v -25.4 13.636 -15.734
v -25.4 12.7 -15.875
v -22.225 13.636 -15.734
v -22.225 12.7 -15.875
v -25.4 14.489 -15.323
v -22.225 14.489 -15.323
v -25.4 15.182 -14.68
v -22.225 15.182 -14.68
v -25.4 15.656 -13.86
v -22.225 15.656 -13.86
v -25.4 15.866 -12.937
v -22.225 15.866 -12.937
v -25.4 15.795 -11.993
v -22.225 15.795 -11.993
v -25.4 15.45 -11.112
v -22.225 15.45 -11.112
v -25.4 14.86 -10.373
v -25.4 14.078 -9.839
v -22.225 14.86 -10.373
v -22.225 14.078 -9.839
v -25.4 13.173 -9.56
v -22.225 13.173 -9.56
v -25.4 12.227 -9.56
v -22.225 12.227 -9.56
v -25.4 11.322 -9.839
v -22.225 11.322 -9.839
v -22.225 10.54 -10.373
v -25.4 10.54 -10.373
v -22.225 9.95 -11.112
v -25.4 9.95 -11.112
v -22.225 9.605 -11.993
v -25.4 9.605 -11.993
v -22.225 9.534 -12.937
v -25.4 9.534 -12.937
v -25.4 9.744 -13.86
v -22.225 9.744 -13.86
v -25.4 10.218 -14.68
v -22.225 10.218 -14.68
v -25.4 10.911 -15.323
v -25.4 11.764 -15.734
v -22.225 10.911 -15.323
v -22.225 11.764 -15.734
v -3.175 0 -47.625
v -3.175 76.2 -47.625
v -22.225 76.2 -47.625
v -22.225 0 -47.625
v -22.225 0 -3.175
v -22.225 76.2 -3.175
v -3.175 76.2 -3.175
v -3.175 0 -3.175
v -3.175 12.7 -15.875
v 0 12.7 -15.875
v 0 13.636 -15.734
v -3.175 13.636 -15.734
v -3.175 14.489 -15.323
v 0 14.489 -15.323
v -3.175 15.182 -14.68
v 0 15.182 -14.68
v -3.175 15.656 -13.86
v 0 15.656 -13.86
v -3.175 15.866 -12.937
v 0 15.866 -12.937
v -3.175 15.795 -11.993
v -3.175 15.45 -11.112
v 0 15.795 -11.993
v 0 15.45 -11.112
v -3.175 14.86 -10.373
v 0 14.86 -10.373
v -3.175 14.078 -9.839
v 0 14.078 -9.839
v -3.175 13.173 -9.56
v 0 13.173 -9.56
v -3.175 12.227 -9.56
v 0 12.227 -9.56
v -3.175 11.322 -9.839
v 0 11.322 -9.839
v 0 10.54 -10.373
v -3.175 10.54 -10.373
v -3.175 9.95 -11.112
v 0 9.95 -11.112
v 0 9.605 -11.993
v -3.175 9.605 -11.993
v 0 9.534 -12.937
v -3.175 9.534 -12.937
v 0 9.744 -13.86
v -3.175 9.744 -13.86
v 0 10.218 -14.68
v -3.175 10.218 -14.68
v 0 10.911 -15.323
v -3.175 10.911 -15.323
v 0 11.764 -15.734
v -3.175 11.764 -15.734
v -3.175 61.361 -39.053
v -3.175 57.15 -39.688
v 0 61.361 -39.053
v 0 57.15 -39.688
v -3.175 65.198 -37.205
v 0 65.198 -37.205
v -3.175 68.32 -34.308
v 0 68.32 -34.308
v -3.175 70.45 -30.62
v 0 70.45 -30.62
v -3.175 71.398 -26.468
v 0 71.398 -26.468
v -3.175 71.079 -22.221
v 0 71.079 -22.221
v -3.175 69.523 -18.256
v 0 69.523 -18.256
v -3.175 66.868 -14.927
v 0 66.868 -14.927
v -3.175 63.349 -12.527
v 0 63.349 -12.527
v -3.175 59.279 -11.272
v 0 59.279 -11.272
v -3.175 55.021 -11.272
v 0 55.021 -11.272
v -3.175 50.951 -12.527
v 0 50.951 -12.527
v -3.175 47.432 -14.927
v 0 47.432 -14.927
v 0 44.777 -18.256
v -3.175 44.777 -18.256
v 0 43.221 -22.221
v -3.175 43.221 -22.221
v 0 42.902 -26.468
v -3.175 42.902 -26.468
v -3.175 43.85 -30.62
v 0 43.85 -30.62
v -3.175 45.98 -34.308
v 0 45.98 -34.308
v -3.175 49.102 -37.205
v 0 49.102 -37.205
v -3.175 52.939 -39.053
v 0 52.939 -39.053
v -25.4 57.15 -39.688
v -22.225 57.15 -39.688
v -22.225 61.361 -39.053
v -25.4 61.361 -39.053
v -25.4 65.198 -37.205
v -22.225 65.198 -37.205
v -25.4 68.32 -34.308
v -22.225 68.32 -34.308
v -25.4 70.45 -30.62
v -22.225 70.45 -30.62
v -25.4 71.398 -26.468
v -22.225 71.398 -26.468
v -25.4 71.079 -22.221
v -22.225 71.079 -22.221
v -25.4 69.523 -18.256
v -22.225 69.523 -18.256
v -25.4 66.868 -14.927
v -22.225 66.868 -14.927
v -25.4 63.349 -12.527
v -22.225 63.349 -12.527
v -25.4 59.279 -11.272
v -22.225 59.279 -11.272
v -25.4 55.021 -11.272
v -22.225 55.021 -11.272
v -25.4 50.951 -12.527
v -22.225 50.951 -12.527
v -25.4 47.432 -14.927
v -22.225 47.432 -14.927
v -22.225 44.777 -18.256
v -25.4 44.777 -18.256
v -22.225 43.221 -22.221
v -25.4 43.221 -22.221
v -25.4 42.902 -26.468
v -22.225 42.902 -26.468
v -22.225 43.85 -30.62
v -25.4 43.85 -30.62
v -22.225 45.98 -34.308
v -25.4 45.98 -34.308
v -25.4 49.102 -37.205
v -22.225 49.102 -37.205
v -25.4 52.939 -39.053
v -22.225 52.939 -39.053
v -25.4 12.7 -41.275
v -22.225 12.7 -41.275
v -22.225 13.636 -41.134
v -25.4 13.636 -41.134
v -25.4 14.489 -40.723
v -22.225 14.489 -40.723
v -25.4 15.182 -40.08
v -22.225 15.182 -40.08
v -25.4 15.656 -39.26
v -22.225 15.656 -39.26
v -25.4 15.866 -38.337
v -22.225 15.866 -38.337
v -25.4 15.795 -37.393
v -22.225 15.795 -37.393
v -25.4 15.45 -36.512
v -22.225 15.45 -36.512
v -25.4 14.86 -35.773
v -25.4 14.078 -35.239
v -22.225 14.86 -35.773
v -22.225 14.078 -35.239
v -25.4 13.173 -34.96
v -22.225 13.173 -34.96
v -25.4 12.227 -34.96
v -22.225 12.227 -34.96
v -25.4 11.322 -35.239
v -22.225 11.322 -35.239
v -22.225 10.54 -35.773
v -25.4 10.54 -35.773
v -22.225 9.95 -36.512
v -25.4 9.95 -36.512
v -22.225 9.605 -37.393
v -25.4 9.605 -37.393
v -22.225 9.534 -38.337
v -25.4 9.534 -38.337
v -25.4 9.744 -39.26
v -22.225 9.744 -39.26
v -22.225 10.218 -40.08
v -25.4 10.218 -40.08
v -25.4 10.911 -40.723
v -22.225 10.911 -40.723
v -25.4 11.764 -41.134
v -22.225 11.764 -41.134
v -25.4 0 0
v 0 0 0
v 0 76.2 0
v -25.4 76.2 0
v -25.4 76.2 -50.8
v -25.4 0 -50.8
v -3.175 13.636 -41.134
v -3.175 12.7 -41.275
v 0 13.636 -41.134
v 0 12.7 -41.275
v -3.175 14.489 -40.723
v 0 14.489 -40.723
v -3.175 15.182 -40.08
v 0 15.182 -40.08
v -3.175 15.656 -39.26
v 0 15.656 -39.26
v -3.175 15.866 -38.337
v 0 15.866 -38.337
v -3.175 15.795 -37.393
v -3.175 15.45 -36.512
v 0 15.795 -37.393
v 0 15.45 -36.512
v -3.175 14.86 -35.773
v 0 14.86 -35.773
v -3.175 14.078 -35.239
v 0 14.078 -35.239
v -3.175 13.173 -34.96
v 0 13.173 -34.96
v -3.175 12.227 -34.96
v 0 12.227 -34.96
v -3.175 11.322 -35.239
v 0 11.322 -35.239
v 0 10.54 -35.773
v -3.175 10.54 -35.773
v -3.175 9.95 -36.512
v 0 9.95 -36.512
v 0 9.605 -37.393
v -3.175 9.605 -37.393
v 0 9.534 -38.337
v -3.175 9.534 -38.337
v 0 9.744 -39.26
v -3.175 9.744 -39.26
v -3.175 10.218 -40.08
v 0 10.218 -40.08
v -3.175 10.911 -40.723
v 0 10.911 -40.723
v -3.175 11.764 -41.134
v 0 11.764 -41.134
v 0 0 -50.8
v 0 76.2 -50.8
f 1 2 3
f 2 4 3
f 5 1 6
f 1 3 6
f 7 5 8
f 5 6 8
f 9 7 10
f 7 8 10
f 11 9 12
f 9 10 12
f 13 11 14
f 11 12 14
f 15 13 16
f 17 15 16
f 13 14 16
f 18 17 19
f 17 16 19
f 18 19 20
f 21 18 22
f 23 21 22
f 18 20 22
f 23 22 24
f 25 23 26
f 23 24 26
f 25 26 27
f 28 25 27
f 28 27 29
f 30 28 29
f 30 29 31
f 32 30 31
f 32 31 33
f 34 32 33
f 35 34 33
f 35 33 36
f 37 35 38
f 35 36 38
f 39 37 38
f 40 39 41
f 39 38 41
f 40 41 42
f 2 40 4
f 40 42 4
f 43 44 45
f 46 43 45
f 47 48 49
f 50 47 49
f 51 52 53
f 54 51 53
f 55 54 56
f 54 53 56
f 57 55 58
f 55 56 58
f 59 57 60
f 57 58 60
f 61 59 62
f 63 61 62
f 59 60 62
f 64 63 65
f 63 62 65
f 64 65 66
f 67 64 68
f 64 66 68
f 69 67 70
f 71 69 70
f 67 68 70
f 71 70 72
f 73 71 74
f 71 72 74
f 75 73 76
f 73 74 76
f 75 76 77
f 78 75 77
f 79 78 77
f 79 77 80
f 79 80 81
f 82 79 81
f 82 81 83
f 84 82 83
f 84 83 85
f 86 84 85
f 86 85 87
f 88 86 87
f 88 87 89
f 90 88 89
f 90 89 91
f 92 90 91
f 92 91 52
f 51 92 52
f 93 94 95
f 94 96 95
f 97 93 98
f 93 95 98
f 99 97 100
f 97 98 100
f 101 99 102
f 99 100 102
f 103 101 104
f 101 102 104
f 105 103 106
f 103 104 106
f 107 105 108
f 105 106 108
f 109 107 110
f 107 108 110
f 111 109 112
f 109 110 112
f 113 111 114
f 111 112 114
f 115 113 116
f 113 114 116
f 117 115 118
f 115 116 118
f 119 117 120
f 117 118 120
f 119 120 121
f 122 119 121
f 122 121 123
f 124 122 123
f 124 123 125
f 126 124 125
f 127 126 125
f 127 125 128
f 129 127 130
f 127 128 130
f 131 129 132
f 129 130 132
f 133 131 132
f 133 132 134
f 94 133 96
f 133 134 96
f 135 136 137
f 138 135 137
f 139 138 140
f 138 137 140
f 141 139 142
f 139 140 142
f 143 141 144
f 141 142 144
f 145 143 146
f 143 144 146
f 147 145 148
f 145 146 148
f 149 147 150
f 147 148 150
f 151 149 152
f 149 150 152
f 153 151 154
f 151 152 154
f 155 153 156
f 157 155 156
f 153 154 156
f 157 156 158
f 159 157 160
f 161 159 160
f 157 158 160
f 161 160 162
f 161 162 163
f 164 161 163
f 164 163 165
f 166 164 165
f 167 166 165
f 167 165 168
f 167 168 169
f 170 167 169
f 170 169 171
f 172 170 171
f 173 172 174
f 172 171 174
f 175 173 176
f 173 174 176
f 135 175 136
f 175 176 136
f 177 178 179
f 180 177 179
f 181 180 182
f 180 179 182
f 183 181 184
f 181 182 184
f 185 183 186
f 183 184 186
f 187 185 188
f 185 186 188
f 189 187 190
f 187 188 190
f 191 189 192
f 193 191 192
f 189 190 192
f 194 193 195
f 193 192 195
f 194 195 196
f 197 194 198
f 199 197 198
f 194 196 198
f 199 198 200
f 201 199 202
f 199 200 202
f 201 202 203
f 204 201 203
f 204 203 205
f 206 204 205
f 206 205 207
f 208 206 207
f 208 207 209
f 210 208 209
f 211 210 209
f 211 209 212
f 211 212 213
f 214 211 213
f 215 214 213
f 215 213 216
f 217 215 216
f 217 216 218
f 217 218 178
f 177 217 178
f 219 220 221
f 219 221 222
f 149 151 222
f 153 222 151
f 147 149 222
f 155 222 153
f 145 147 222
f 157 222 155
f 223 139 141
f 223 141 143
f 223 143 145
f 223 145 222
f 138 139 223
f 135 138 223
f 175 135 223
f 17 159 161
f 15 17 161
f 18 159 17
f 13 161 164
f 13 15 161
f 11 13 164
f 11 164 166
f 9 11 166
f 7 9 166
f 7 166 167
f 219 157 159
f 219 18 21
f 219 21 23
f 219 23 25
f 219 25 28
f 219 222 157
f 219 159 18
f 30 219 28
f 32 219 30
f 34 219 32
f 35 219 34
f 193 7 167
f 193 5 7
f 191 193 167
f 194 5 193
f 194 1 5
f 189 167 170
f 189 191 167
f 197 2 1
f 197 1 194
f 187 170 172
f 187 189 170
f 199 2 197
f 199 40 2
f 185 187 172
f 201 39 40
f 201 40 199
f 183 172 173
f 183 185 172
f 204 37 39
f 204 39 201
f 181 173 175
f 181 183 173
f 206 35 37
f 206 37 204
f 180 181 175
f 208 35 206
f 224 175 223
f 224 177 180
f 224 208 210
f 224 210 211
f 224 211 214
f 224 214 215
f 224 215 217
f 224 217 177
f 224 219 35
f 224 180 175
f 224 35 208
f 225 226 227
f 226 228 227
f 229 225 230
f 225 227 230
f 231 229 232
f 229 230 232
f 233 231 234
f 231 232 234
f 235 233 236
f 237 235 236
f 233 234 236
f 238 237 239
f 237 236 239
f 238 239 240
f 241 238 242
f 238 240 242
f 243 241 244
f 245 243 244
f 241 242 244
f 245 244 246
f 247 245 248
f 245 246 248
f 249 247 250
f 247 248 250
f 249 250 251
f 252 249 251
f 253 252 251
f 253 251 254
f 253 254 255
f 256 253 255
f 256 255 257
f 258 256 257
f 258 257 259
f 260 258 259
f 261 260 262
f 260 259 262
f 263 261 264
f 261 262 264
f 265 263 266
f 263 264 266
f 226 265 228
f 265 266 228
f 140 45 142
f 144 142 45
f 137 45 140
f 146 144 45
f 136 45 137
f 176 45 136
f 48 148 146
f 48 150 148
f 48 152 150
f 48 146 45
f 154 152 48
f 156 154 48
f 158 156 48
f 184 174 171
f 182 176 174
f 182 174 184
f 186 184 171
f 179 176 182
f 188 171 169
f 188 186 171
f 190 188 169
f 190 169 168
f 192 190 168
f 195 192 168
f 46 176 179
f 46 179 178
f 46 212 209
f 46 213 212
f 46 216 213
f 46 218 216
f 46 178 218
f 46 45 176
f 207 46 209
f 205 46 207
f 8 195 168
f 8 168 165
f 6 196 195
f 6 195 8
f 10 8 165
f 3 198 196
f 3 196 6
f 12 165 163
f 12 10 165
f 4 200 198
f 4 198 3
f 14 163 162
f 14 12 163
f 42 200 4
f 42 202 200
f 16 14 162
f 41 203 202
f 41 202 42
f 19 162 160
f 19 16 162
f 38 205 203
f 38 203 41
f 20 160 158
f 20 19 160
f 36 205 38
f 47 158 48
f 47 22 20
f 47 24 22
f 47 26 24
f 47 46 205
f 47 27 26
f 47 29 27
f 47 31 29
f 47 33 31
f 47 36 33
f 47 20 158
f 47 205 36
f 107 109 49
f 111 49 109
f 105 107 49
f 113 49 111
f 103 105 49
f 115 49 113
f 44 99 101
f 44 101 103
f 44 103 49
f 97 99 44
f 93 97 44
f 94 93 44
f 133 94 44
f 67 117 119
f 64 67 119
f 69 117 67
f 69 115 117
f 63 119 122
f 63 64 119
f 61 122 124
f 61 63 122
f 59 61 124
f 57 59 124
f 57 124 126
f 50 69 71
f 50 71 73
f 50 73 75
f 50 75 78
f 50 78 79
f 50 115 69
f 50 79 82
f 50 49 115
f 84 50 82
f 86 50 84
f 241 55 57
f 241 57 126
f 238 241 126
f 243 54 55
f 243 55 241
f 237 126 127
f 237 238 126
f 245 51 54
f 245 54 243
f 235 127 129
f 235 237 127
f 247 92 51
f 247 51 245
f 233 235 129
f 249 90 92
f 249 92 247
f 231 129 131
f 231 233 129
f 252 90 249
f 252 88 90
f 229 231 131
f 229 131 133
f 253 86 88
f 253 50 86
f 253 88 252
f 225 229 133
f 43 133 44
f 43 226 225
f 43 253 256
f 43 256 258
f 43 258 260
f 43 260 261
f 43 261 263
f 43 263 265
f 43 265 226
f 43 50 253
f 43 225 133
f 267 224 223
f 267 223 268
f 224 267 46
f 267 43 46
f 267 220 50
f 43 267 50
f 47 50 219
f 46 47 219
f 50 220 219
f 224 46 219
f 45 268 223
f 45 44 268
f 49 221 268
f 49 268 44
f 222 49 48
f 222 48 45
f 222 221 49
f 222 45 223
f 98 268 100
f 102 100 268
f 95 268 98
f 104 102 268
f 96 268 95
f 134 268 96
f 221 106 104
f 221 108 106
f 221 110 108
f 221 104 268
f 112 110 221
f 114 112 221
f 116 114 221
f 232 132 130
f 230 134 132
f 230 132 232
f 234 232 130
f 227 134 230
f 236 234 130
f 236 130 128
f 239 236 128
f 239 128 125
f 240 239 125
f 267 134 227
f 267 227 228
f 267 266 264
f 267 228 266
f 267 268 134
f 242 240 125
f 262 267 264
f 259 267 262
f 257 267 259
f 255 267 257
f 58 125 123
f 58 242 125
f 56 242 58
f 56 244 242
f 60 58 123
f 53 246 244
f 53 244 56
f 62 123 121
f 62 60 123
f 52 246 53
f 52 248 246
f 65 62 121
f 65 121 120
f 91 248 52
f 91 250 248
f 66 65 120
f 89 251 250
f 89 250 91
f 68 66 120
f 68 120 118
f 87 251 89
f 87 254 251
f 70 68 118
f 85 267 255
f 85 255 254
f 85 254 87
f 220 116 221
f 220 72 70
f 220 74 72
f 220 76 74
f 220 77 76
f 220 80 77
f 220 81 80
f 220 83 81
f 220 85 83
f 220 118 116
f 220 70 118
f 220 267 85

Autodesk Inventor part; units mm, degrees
ref_plane "YZ Plane" through (0, 0, 0) normal (1, 0, 0) x (0, 1, 0)
ref_plane "XZ Plane" through (0, 0, 0) normal (0, 1, 0) x (-1, 0, 0)
ref_plane "XY Plane" through (0, 0, 0) normal (0, 0, 1) x (1, 0, 0)
sketch "Sketch1" plane through (0, 0, 0) normal (0, 1, 0) x (-1, 0, 0)
  line L0 (0, 0) -> (25.4, 0)
  line L1 (25.4, 0) -> (25.4, -50.8)
  line L2 (25.4, -50.8) -> (0, -50.8)
  line L3 (0, -50.8) -> (0, 0)
  line L4 (22.225, -3.175) -> (3.175, -3.175)
  line L5 (3.175, -3.175) -> (3.175, -47.625)
  line L6 (3.175, -47.625) -> (22.225, -47.625)
  line L7 (22.225, -47.625) -> (22.225, -3.175)
  dimension "d0" = 50.8
  dimension "d1" = 25.4
  dimension "d2" = 3.175
  dimension "d3" = 3.175
  dimension "d4" = 3.175
  dimension "d5" = 3.175
extrude "Extrusion1" add sketch "Sketch1" along normal blind 76.2
sketch "Sketch2" plane through (0, 0, 0) normal (1, 0, 0) x (0, 0, -1)
  circle A0 centre (12.7, 12.7) radius 3.175
  circle A1 centre (38.1, 12.7) radius 3.175
  line L0 (50.8, 0) -> (0, 0) projected
  line L1 (0, 0) -> (0, 76.2) projected
  line L2 (50.8, 0) -> (50.8, 76.2) projected
  circle A2 centre (25.4, 57.15) radius 14.2875
  line L3 (0, 76.2) -> (50.8, 76.2) projected
  dimension "d8" = 12.7
  dimension "d9" = 6.35
  dimension "d10" = 12.7
  dimension "d11" = 12.7
  dimension "d12" = 12.7
  dimension "d13" = 6.35
  dimension "d14" = 28.575
  dimension "d15" = 19.05
  dimension "d16" = 25.4
extrude "Extrusion2" cut sketch "Sketch2" against normal blind 76.2 contours A0 | A1 | A2
equation "\"d3\" = d2"
equation "\"d4\" = d2"
equation "\"d5\" = d2"
properties part number "Hexshaft mount for 8020"
